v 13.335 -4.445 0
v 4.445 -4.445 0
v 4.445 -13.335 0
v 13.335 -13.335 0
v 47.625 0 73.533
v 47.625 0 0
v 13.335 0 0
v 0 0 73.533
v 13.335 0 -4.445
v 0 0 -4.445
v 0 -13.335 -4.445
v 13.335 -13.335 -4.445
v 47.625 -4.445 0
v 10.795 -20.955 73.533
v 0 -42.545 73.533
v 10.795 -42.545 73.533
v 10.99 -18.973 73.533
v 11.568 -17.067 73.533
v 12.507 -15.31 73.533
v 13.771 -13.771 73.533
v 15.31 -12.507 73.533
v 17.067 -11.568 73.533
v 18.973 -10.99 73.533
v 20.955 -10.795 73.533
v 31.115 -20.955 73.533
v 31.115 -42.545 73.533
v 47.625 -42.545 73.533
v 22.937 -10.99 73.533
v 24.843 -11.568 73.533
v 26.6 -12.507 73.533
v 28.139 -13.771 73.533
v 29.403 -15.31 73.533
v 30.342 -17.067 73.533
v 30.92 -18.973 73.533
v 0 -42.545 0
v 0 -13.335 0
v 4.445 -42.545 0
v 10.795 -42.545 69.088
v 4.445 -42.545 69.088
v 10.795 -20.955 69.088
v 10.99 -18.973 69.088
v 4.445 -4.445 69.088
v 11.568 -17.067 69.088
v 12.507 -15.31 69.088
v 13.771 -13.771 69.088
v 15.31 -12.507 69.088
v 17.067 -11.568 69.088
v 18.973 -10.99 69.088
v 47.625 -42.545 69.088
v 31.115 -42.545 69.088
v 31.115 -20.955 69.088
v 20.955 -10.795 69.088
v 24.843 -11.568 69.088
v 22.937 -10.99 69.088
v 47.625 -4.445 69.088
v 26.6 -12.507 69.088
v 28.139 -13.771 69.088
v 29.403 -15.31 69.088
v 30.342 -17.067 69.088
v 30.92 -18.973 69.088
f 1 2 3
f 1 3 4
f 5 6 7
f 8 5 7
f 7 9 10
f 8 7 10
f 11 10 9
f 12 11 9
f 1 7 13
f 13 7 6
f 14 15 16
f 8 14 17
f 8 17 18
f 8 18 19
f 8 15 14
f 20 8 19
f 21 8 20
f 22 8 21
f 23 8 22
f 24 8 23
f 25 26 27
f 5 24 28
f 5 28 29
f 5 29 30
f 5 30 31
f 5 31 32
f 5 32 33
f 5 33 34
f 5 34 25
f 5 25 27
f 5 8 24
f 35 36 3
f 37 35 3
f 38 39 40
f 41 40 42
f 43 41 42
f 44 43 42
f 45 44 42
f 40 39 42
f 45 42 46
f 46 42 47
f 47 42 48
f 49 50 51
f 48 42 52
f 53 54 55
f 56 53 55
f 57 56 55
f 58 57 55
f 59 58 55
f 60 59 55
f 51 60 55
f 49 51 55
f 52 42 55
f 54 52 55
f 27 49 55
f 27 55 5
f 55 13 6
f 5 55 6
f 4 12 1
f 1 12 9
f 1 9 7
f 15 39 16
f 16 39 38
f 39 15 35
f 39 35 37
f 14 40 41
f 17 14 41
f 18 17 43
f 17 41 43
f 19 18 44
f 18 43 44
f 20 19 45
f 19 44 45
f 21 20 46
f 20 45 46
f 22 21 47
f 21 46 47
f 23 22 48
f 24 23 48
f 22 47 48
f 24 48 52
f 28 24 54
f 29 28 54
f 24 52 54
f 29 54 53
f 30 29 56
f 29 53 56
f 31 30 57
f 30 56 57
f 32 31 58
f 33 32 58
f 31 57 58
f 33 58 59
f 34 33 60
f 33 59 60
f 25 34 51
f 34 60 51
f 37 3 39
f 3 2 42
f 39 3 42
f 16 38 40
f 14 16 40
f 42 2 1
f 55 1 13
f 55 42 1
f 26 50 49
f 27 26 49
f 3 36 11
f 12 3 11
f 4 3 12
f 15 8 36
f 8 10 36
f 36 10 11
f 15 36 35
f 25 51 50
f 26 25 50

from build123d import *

# Parameters (mm, degrees)
F0_W     = 4.445
F0_H     = 69.088
F1_DEPTH = 42.545
F2_W     = 43.18
F2_H     = 69.088
F3_DEPTH = 4.445
F4_W     = 13.335
F4_H     = 4.445
F5_DEPTH = 13.335
F7_DEPTH = 4.445


with BuildPart() as f1:
    # F0 (on Front) → F1 (new body)
    with BuildSketch(Plane.XZ):
        with Locations((2.2225, 34.544)):
            Rectangle(F0_W, F0_H)
    extrude(amount=F1_DEPTH)

    # F2 (on Front) → F3 (join)
    with BuildSketch(Plane.XZ):
        with Locations((26.035, 34.544)):
            Rectangle(F2_W, F2_H)
    extrude(amount=F3_DEPTH)

    # F4 (on Front) → F5 (join)
    with BuildSketch(Plane.XZ):
        with Locations((6.6675, -2.2225)):
            Rectangle(F4_W, F4_H)
    extrude(amount=F5_DEPTH)

    # F6 (on face) → F7 (join)
    with BuildSketch(Plane.XY.offset(69.088)):
        with BuildLine():
            Line((47.625, 0), (0, 0))
            Line((0, 0), (0, -42.545))
            Line((0, -42.545), (10.795, -42.545))
            Line((10.795, -42.545), (10.795, -20.955))
            ThreePointArc((10.795, -20.955), (20.955, -10.795), (31.115, -20.955))
            Line((31.115, -20.955), (31.115, -42.545))
            Line((31.115, -42.545), (47.625, -42.545))
            Line((47.625, -42.545), (47.625, 0))
        make_face()
    extrude(amount=F7_DEPTH)


solid = f1.part
